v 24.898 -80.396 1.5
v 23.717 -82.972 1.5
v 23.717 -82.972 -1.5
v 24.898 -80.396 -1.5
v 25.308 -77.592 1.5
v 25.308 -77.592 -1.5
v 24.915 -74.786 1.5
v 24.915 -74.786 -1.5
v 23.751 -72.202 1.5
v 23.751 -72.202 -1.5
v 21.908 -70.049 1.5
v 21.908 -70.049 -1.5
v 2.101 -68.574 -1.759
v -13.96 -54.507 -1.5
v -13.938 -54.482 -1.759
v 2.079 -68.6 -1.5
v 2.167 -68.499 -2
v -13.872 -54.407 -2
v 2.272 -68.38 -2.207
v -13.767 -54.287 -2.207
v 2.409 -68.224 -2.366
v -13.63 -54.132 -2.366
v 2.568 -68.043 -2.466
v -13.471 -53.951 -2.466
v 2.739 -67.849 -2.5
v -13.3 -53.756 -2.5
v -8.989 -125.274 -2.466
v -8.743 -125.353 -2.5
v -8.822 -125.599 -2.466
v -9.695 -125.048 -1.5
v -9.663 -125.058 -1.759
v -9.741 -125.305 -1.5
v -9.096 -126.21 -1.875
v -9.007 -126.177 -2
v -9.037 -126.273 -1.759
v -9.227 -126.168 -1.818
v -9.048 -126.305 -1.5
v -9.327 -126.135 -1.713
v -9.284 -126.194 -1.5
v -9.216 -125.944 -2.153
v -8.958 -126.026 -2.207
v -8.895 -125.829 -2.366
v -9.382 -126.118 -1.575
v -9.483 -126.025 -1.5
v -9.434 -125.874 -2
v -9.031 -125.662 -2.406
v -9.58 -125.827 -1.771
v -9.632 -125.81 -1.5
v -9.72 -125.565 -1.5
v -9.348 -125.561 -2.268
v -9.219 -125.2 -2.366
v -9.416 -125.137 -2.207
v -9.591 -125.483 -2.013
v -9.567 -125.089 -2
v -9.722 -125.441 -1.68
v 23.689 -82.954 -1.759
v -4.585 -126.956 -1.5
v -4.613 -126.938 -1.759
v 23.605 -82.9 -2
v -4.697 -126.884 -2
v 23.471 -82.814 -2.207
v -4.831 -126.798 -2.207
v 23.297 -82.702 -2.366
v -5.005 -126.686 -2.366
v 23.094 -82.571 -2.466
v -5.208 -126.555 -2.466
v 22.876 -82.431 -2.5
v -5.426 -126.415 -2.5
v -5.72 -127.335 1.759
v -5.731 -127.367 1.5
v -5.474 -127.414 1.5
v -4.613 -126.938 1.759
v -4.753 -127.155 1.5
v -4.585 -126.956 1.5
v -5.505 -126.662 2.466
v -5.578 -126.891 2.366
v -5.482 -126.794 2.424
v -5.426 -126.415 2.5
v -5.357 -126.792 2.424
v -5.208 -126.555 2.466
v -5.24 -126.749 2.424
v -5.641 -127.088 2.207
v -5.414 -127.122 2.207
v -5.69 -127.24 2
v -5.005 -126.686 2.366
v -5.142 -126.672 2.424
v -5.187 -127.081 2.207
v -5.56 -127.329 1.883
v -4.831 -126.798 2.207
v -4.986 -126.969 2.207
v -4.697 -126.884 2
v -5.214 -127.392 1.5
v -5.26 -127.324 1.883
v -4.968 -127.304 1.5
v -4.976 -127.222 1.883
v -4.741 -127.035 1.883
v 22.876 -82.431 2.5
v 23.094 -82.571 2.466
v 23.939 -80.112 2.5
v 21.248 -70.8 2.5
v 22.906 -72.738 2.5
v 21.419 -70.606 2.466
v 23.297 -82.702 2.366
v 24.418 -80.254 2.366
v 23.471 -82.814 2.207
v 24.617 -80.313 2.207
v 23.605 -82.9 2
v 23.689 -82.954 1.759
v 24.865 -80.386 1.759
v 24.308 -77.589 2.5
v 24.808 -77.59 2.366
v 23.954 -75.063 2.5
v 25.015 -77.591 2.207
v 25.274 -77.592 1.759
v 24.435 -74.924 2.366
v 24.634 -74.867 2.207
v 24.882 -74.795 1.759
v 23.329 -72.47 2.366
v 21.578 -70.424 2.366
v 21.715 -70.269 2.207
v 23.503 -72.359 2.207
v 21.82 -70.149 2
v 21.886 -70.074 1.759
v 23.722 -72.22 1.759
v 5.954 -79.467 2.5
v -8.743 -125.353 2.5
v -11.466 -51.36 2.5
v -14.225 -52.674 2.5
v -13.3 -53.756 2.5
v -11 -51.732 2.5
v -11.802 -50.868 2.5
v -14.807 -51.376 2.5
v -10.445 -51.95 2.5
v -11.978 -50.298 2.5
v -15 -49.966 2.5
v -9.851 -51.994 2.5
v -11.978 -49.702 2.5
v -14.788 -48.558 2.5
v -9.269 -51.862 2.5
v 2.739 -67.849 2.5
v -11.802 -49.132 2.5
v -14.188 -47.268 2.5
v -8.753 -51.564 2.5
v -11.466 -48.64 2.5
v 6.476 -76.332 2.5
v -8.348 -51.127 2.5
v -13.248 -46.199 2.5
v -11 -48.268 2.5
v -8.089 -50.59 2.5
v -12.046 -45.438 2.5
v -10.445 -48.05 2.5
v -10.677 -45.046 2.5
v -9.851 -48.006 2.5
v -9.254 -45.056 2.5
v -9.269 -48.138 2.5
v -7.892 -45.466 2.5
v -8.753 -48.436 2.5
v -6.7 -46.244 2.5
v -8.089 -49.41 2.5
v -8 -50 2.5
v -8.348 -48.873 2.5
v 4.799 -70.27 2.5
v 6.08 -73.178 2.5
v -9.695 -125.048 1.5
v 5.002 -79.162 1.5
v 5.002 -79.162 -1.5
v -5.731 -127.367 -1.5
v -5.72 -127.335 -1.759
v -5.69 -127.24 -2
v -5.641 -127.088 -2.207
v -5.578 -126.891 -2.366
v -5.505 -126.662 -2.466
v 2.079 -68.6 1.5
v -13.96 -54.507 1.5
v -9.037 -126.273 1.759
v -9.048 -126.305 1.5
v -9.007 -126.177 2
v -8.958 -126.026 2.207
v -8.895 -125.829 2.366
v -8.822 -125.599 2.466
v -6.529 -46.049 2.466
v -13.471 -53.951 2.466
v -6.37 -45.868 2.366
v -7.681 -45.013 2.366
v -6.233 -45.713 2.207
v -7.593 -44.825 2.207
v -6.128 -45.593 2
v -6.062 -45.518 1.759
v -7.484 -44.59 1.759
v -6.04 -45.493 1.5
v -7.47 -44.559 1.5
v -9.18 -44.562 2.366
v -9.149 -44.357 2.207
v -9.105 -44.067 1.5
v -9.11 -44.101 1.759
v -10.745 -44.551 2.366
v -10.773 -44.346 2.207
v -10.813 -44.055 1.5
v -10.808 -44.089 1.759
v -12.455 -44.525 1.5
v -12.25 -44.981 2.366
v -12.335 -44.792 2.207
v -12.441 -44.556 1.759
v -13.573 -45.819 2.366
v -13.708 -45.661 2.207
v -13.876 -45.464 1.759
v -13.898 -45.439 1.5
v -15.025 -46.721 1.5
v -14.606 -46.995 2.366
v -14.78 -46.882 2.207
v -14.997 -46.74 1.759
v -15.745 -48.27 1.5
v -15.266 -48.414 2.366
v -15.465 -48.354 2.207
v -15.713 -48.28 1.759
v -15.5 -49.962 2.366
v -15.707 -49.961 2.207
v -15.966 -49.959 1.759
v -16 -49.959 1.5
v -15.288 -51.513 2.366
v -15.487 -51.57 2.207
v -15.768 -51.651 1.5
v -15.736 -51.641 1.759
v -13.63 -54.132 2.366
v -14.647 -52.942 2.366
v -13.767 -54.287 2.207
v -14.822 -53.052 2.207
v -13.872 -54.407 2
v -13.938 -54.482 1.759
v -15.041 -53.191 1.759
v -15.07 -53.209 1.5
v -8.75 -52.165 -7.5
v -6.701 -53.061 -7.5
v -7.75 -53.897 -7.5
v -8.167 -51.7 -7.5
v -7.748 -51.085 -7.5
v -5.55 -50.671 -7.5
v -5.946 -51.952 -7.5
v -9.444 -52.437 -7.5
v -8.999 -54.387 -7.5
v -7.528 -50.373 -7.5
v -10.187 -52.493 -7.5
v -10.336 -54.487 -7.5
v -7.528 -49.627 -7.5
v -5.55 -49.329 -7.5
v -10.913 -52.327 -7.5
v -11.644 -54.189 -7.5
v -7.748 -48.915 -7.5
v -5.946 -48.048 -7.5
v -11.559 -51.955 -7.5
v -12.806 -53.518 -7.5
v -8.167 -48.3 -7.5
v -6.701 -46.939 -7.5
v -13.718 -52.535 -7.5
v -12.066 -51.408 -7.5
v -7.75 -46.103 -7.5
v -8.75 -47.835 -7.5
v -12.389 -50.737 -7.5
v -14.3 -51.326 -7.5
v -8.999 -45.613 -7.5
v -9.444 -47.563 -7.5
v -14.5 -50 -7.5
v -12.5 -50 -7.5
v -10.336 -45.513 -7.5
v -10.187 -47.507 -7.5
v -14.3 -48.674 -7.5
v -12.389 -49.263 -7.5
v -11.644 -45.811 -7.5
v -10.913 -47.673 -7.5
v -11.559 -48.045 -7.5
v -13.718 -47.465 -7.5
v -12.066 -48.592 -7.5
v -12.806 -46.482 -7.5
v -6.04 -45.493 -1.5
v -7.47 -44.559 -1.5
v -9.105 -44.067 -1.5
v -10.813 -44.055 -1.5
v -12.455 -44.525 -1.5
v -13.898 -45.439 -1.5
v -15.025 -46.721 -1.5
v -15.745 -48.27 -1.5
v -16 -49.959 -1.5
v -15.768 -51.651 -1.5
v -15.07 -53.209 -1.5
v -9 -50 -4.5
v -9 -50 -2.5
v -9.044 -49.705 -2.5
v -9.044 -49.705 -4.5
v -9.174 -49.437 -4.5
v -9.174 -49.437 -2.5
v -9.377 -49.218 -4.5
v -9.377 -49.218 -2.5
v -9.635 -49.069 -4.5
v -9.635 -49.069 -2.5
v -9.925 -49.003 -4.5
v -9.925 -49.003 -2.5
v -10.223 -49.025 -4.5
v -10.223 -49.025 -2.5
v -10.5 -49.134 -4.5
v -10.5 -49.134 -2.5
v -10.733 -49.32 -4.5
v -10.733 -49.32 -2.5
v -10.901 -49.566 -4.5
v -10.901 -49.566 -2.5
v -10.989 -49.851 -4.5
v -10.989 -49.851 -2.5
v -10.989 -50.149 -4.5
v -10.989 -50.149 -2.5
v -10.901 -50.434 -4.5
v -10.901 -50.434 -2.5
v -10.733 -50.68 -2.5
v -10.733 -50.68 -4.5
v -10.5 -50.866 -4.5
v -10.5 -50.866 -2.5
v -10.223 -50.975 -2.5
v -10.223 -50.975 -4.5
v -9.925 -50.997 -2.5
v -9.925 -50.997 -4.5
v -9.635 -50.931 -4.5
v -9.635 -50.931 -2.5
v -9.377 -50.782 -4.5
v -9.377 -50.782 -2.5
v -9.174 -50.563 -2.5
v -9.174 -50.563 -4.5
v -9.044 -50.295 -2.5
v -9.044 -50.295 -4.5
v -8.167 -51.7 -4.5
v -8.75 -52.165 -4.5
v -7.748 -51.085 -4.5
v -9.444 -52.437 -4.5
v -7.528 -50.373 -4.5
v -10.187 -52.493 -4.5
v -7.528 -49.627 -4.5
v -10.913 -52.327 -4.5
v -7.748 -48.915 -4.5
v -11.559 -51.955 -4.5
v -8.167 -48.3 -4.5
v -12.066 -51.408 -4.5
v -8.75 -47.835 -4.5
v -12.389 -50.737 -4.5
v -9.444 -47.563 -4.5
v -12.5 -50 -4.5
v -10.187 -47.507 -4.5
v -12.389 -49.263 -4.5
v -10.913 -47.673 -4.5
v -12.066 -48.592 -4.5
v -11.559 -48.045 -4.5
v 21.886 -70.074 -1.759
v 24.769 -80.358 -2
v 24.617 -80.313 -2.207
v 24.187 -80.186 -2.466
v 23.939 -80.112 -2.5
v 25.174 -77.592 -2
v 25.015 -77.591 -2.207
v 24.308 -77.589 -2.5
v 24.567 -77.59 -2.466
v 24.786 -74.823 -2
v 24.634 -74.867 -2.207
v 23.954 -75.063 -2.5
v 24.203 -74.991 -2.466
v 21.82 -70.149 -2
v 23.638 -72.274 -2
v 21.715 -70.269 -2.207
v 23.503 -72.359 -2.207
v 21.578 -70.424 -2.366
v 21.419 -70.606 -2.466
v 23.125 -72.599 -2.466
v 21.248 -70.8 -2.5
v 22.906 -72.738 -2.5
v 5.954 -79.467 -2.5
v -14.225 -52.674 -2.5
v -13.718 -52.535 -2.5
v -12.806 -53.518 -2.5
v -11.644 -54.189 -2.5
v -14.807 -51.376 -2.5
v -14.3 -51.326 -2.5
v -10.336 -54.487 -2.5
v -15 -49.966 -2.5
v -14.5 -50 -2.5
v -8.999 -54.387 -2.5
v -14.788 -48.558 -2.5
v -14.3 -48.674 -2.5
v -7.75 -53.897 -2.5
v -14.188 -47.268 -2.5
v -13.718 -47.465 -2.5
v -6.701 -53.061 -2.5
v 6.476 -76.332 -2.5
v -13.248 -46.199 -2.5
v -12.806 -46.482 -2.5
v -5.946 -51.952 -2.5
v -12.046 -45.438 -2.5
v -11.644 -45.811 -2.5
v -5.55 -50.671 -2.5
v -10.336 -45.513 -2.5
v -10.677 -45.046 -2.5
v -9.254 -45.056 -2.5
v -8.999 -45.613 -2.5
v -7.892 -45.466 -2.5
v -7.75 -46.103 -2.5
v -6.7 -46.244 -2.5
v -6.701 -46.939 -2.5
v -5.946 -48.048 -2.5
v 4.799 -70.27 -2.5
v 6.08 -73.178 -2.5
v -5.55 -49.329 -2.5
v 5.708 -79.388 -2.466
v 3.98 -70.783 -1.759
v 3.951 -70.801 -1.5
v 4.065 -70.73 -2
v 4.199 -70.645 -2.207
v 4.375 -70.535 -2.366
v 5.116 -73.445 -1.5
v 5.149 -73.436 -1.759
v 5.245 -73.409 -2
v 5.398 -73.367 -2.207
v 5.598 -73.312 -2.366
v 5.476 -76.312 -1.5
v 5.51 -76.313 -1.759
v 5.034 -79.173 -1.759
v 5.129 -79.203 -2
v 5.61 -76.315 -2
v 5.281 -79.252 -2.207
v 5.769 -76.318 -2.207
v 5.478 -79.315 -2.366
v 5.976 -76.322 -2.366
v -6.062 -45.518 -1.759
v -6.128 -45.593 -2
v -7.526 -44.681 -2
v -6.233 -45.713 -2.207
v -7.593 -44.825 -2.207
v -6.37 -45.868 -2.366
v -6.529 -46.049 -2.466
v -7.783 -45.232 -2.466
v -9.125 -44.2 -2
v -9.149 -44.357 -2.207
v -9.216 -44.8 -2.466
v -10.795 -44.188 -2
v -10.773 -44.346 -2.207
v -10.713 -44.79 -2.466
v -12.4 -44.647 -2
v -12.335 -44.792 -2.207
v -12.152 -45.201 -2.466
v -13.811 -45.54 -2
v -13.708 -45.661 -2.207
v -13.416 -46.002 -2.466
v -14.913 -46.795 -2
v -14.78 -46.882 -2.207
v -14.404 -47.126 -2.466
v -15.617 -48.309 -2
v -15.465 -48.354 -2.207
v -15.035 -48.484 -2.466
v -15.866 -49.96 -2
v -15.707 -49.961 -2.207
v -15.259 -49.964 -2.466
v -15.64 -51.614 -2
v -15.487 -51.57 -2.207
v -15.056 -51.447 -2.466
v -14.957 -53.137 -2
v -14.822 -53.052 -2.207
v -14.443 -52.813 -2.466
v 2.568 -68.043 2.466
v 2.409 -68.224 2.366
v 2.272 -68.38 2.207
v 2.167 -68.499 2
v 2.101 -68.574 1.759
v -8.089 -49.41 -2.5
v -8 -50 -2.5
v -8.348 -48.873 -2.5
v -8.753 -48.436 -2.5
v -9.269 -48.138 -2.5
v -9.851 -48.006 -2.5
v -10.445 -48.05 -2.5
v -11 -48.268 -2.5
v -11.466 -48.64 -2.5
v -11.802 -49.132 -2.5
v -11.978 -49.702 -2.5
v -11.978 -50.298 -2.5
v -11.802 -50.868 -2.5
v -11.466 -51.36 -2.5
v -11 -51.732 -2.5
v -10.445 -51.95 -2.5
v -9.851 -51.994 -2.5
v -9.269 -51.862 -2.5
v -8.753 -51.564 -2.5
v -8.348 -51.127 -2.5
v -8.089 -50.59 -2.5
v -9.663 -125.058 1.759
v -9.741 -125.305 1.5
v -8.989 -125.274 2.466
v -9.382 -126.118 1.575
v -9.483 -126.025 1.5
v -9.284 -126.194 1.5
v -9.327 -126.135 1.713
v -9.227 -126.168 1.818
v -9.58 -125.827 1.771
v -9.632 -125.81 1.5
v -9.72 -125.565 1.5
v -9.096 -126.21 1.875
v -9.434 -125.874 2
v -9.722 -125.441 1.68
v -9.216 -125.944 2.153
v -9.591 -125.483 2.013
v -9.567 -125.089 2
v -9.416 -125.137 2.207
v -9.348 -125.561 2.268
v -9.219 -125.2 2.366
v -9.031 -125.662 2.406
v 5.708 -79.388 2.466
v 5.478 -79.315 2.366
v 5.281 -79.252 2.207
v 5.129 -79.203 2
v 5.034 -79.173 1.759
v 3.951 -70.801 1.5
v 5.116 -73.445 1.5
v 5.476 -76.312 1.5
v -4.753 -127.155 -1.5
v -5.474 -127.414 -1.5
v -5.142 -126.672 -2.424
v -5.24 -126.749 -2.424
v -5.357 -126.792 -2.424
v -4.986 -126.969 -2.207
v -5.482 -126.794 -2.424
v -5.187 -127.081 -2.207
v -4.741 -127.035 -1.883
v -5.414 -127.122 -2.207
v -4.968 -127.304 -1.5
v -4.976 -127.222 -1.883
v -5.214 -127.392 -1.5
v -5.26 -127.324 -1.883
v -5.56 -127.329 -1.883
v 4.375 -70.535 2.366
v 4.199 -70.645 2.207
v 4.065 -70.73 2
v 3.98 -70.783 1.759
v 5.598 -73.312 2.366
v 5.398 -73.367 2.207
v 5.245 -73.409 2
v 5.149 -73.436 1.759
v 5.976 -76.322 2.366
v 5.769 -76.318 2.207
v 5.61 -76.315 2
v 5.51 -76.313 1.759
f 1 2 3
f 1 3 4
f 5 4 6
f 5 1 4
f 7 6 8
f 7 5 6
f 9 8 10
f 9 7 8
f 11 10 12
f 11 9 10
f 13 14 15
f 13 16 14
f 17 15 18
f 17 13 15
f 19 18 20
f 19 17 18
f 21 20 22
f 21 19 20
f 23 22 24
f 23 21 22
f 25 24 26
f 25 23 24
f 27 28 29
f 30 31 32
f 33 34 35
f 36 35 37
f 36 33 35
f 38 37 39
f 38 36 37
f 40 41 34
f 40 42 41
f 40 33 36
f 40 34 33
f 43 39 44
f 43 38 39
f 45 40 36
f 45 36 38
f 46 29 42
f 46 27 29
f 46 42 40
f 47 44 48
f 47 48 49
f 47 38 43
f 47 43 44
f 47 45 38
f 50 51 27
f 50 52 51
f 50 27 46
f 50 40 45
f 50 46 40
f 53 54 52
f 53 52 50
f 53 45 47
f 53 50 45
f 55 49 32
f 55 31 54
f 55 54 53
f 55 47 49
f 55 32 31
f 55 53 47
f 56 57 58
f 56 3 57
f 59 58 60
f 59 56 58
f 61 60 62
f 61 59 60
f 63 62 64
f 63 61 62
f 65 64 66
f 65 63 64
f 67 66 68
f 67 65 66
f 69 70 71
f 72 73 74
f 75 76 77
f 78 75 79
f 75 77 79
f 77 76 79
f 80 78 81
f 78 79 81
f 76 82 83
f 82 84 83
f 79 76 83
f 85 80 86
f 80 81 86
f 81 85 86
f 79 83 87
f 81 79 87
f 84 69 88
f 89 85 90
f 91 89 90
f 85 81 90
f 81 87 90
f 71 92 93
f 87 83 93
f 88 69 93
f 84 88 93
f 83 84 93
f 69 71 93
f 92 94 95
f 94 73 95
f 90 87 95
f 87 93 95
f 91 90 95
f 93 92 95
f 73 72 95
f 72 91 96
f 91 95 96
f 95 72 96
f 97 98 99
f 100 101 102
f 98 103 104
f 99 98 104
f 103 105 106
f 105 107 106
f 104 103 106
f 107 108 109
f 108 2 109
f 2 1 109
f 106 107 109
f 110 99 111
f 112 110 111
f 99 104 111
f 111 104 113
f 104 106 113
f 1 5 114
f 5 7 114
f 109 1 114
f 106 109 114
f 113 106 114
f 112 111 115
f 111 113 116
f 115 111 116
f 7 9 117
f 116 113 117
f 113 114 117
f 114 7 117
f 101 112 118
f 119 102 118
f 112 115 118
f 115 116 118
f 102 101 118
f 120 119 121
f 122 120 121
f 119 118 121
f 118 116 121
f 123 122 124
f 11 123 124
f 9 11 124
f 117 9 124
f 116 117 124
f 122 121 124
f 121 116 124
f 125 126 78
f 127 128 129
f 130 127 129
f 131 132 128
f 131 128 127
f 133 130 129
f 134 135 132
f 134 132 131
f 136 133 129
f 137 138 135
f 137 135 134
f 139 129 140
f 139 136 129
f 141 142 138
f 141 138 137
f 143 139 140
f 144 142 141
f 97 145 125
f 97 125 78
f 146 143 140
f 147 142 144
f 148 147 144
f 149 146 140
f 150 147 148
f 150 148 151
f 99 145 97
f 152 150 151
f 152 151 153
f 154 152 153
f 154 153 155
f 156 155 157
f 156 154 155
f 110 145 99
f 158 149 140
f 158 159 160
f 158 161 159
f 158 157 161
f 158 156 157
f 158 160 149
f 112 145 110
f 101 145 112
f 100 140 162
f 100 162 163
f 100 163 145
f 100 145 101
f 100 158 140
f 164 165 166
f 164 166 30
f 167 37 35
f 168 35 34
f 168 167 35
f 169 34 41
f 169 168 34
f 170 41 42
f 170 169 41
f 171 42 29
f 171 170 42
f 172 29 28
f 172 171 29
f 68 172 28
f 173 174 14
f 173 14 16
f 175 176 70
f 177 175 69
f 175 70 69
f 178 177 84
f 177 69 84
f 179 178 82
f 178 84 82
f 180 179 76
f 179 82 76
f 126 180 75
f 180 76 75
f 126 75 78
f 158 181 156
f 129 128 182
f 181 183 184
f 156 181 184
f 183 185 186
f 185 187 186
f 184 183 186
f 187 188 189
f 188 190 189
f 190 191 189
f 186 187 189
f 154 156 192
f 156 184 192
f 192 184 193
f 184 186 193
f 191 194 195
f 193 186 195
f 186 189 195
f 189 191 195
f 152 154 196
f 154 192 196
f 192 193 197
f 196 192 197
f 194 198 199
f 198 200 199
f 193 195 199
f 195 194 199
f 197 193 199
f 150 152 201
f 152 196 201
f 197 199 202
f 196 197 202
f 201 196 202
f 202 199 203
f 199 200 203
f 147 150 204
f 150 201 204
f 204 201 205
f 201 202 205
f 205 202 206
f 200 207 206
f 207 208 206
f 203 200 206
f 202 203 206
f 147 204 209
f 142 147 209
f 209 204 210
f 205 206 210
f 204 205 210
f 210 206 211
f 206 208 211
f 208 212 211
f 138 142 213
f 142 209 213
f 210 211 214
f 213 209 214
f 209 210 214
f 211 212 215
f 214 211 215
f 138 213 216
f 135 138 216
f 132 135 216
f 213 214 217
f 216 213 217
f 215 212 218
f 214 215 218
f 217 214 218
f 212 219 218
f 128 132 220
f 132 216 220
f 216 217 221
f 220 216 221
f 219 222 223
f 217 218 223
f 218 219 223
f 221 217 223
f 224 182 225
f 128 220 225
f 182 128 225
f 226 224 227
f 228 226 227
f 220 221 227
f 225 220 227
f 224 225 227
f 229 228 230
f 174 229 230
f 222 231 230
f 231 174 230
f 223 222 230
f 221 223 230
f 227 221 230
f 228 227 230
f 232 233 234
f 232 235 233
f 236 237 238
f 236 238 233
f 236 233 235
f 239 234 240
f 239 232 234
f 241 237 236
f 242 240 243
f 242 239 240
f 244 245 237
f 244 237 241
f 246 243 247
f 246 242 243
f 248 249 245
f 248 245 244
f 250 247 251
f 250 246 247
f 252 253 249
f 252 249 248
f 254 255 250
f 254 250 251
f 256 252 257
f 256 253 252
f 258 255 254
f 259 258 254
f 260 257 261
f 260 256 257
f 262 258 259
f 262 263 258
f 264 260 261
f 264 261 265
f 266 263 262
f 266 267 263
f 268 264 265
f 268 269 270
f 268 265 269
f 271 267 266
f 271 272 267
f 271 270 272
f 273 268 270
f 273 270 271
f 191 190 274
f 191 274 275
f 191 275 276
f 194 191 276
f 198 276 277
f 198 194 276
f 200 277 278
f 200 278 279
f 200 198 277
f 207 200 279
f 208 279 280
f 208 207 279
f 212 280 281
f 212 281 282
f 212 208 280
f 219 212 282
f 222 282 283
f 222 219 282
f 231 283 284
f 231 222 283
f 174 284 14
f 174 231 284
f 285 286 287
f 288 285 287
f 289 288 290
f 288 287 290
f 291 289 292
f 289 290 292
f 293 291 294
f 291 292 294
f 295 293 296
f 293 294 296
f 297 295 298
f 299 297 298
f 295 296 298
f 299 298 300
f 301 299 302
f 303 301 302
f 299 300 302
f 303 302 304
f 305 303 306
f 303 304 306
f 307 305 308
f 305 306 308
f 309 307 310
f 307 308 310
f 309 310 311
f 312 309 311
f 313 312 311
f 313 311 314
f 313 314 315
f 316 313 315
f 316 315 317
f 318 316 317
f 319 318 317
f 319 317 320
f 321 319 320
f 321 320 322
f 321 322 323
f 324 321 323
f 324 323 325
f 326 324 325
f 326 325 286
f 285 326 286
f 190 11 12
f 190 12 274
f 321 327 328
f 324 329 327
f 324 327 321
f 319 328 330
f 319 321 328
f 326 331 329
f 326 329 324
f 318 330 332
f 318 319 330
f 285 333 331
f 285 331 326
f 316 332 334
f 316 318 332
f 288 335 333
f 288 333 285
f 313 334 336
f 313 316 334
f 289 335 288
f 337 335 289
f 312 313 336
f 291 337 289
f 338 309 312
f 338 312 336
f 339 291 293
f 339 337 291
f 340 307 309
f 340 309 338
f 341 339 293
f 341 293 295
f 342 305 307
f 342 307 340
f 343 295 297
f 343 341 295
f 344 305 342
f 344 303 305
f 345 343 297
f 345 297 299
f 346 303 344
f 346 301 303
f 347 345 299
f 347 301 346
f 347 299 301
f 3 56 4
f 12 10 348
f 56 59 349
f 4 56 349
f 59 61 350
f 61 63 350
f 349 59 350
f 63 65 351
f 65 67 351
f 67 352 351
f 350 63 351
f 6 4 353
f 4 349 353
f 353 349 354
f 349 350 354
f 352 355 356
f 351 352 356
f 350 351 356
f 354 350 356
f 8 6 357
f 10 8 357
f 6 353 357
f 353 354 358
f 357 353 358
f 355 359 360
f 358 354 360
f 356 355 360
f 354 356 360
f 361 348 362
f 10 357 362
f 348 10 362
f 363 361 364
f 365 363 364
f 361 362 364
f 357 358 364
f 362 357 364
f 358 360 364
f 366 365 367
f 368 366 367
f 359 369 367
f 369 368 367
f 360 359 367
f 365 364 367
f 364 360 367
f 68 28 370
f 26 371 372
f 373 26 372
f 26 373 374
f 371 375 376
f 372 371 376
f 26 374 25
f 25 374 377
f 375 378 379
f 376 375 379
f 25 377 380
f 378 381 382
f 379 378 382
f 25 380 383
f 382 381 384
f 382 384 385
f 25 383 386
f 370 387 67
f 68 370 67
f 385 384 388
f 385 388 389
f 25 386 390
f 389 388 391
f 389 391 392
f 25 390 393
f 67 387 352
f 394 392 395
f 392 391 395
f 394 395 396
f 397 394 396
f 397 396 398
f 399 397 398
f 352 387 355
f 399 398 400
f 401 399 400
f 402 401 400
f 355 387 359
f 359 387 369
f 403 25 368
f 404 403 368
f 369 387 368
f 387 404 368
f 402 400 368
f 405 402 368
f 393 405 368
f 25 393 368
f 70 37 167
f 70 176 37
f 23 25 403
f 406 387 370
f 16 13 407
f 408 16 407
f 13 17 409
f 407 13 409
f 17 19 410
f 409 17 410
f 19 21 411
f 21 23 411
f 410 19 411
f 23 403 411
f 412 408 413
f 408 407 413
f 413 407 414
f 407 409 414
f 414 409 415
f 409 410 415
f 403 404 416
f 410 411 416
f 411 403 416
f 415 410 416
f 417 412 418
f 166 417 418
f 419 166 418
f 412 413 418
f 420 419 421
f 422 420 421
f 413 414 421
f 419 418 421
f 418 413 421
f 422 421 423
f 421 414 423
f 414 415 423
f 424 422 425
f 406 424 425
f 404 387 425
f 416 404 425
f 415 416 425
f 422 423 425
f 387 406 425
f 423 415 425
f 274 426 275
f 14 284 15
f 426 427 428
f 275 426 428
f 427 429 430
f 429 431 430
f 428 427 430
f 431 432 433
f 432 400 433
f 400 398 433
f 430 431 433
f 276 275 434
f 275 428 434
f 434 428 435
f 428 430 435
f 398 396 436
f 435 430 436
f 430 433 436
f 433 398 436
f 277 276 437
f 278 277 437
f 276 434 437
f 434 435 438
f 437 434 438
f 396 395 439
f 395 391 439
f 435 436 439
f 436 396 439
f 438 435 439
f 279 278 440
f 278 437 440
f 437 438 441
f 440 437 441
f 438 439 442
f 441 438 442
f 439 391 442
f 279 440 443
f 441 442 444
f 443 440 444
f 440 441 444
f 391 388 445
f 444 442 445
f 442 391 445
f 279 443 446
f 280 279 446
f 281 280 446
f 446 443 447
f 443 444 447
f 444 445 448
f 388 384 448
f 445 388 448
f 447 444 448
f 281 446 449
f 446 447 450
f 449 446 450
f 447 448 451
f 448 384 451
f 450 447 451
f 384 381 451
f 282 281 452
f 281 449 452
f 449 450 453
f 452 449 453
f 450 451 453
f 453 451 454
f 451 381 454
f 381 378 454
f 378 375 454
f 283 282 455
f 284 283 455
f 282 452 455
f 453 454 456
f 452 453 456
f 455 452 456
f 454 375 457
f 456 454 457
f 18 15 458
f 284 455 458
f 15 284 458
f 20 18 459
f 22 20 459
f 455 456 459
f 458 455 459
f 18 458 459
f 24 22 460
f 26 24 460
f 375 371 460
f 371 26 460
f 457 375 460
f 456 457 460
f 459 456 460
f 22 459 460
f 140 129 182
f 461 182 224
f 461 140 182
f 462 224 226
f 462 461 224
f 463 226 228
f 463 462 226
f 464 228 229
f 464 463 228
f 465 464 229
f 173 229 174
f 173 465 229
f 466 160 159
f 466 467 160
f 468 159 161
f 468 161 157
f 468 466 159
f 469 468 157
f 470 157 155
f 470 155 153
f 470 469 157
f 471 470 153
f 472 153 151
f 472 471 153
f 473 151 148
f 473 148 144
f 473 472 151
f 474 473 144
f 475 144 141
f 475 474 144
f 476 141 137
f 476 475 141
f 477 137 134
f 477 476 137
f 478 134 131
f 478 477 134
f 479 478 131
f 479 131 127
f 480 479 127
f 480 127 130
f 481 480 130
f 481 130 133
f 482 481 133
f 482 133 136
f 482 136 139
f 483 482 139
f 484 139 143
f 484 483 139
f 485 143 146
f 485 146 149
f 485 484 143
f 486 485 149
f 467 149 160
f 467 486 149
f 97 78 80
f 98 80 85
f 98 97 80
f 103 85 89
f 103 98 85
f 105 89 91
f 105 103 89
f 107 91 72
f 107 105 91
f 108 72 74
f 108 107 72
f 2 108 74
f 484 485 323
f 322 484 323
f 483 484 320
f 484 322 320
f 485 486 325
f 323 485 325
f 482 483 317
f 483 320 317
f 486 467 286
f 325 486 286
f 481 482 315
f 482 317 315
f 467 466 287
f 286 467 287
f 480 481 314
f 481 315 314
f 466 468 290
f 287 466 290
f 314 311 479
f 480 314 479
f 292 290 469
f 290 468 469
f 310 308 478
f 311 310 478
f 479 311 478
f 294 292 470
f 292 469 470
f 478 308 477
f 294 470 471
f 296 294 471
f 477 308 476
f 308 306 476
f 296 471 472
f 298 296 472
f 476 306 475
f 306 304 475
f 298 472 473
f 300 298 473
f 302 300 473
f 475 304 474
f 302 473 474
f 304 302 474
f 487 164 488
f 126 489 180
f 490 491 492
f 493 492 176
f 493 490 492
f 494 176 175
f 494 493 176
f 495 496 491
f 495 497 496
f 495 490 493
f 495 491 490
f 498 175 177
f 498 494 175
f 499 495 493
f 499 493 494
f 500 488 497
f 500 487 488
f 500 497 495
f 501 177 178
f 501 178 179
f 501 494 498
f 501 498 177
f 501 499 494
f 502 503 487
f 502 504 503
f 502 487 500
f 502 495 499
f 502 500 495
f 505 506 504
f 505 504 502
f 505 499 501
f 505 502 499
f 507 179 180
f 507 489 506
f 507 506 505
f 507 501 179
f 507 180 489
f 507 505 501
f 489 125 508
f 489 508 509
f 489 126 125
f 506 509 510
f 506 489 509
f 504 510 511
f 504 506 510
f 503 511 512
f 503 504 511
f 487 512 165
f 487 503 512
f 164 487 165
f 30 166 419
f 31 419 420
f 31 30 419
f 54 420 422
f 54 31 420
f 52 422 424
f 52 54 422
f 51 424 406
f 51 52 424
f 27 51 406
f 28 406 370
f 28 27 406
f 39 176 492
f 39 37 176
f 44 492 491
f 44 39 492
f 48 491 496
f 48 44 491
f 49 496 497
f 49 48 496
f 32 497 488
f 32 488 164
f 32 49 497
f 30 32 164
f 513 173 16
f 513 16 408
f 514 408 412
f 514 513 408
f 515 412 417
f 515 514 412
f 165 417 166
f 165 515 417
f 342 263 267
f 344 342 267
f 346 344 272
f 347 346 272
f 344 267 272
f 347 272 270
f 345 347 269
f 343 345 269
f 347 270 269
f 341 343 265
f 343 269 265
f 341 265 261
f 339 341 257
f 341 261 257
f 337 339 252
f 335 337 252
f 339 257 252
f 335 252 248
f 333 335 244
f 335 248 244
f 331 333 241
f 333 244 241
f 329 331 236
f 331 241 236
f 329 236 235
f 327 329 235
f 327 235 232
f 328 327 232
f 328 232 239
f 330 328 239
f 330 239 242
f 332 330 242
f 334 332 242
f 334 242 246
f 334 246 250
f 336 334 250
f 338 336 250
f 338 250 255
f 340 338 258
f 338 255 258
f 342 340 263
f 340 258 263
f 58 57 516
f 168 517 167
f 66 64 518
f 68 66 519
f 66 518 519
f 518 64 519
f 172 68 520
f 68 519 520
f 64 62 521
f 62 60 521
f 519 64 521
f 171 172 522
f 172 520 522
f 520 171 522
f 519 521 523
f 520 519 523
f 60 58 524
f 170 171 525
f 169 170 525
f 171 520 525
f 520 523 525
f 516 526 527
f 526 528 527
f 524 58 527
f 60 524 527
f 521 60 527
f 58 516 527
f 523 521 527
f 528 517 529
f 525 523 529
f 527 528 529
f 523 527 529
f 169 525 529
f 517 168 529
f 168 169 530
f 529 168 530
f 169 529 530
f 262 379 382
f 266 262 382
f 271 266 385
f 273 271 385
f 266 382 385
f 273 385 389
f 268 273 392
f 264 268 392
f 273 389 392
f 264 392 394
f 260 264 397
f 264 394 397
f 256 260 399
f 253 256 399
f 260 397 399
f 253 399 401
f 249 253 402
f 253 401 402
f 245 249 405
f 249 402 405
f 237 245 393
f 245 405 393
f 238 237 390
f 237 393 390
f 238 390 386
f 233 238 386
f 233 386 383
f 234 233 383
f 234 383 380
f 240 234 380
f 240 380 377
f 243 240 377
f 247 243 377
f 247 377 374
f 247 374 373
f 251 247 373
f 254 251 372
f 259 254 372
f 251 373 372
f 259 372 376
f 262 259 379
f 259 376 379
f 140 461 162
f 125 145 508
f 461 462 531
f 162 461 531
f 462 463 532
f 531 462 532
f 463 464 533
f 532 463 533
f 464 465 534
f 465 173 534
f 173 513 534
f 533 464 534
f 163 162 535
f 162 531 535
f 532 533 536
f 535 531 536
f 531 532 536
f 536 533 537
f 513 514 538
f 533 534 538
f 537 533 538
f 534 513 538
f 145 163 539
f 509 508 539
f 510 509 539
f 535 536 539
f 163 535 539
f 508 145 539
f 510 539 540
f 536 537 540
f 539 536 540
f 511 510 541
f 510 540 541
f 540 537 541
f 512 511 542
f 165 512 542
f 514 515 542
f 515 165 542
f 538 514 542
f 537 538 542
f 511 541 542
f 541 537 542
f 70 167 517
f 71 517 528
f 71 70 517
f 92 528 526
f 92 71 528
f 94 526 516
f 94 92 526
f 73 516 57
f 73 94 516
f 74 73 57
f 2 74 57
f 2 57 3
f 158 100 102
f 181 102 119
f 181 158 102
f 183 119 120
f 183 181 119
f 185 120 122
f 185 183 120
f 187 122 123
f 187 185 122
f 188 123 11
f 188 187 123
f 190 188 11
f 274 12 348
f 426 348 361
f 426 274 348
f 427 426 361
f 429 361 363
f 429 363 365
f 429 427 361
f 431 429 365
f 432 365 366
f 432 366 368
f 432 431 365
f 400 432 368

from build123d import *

# Parameters (mm, degrees)
SKETCH2_R           = 2
BOSS_EXTRUDE1_DEPTH = 2.5
FILLET1_R           = 1
SKETCH3_R           = 4.5
BOSS_EXTRUDE2_DEPTH = 5
SKETCH4_R           = 2.5
CUT_EXTRUDE1_DEPTH  = 3
SKETCH5_R           = 1
CUT_EXTRUDE2_DEPTH  = 5


with BuildPart() as part:
    # Sketch2 → Boss-Extrude1 (new body, symmetric)
    with BuildSketch(Plane.XY):
        with BuildLine():
            Line((-10, -126), (-5, -127.601468854))
            Line((-5, -127.601468854), (23.717421377, -82.972253802))
            ThreePointArc((23.717421377, -82.972253802), (25.211420403, -76.174808821), (21.908456188, -70.048821656))
            Line((21.908456188, -70.048821656), (-6.039708144, -45.492662824))
            ThreePointArc((-6.039708144, -45.492662824), (-14.507337176, -46.039708144), (-13.960291856, -54.507337176))
            Line((-13.960291856, -54.507337176), (2.078857085, -68.599850882))
            ThreePointArc((2.078857085, -68.599850882), (5.116155087, -73.445037833), (5.001799686, -79.162374502))
            Line((5.001799686, -79.162374502), (-10, -126))
        make_face()
        with Locations((-10, -50)):
            Circle(SKETCH2_R, mode=Mode.SUBTRACT)
    extrude(amount=BOSS_EXTRUDE1_DEPTH, both=True)

    # Fillet1
    fillet1_edges = [part.edges().sort_by_distance(p)[0] for p in [
        (25.211420403, -76.174808821, -2.5),
        (9.358710688, -105.286861328, -2.5),
        (-7.5, -126.800734427, -2.5),
        (-2.499100157, -102.581187251, -2.5),
        (9.358710688, -105.286861328, 2.5),
        (-5, -127.601468854, 0),
        (-10, -126, 0),
        (25.211420403, -76.174808821, 2.5),
        (7.934374022, -57.77074224, 2.5),
        (-14.507337176, -46.039708144, 2.5),
        (-5.940717386, -61.553594029, 2.5),
        (5.116155087, -73.445037833, 2.5),
        (-2.499100157, -102.581187251, 2.5),
        (5.116155087, -73.445037833, -2.5),
        (-7.5, -126.800734427, 2.5),
        (-5.940717386, -61.553594029, -2.5),
        (-14.507337176, -46.039708144, -2.5),
        (7.934374022, -57.77074224, -2.5),
    ]]
    fillet(fillet1_edges, radius=FILLET1_R)

    # Sketch3 → Boss-Extrude2 (add)
    with BuildSketch(Plane(origin=(0, 0, -2.5), x_dir=(-1, 0, 0), z_dir=(0, 0, -1))):
        with Locations((10, -50)):
            Circle(SKETCH3_R)
    extrude(amount=BOSS_EXTRUDE2_DEPTH)

    # Sketch4 → Cut-Extrude1 (cut)
    with BuildSketch(Plane(origin=(0, 0, -7.5), x_dir=(-1, 0, 0), z_dir=(0, 0, -1))):
        with Locations((10, -50)):
            Circle(SKETCH4_R)
    extrude(amount=-CUT_EXTRUDE1_DEPTH, mode=Mode.SUBTRACT)

    # Sketch5 → Cut-Extrude2 (cut)
    with BuildSketch(Plane.XY.offset(-2.5)):
        with Locations((-10, -50)):
            Circle(SKETCH5_R)
    extrude(amount=-CUT_EXTRUDE2_DEPTH, mode=Mode.SUBTRACT)


solid = part.part
